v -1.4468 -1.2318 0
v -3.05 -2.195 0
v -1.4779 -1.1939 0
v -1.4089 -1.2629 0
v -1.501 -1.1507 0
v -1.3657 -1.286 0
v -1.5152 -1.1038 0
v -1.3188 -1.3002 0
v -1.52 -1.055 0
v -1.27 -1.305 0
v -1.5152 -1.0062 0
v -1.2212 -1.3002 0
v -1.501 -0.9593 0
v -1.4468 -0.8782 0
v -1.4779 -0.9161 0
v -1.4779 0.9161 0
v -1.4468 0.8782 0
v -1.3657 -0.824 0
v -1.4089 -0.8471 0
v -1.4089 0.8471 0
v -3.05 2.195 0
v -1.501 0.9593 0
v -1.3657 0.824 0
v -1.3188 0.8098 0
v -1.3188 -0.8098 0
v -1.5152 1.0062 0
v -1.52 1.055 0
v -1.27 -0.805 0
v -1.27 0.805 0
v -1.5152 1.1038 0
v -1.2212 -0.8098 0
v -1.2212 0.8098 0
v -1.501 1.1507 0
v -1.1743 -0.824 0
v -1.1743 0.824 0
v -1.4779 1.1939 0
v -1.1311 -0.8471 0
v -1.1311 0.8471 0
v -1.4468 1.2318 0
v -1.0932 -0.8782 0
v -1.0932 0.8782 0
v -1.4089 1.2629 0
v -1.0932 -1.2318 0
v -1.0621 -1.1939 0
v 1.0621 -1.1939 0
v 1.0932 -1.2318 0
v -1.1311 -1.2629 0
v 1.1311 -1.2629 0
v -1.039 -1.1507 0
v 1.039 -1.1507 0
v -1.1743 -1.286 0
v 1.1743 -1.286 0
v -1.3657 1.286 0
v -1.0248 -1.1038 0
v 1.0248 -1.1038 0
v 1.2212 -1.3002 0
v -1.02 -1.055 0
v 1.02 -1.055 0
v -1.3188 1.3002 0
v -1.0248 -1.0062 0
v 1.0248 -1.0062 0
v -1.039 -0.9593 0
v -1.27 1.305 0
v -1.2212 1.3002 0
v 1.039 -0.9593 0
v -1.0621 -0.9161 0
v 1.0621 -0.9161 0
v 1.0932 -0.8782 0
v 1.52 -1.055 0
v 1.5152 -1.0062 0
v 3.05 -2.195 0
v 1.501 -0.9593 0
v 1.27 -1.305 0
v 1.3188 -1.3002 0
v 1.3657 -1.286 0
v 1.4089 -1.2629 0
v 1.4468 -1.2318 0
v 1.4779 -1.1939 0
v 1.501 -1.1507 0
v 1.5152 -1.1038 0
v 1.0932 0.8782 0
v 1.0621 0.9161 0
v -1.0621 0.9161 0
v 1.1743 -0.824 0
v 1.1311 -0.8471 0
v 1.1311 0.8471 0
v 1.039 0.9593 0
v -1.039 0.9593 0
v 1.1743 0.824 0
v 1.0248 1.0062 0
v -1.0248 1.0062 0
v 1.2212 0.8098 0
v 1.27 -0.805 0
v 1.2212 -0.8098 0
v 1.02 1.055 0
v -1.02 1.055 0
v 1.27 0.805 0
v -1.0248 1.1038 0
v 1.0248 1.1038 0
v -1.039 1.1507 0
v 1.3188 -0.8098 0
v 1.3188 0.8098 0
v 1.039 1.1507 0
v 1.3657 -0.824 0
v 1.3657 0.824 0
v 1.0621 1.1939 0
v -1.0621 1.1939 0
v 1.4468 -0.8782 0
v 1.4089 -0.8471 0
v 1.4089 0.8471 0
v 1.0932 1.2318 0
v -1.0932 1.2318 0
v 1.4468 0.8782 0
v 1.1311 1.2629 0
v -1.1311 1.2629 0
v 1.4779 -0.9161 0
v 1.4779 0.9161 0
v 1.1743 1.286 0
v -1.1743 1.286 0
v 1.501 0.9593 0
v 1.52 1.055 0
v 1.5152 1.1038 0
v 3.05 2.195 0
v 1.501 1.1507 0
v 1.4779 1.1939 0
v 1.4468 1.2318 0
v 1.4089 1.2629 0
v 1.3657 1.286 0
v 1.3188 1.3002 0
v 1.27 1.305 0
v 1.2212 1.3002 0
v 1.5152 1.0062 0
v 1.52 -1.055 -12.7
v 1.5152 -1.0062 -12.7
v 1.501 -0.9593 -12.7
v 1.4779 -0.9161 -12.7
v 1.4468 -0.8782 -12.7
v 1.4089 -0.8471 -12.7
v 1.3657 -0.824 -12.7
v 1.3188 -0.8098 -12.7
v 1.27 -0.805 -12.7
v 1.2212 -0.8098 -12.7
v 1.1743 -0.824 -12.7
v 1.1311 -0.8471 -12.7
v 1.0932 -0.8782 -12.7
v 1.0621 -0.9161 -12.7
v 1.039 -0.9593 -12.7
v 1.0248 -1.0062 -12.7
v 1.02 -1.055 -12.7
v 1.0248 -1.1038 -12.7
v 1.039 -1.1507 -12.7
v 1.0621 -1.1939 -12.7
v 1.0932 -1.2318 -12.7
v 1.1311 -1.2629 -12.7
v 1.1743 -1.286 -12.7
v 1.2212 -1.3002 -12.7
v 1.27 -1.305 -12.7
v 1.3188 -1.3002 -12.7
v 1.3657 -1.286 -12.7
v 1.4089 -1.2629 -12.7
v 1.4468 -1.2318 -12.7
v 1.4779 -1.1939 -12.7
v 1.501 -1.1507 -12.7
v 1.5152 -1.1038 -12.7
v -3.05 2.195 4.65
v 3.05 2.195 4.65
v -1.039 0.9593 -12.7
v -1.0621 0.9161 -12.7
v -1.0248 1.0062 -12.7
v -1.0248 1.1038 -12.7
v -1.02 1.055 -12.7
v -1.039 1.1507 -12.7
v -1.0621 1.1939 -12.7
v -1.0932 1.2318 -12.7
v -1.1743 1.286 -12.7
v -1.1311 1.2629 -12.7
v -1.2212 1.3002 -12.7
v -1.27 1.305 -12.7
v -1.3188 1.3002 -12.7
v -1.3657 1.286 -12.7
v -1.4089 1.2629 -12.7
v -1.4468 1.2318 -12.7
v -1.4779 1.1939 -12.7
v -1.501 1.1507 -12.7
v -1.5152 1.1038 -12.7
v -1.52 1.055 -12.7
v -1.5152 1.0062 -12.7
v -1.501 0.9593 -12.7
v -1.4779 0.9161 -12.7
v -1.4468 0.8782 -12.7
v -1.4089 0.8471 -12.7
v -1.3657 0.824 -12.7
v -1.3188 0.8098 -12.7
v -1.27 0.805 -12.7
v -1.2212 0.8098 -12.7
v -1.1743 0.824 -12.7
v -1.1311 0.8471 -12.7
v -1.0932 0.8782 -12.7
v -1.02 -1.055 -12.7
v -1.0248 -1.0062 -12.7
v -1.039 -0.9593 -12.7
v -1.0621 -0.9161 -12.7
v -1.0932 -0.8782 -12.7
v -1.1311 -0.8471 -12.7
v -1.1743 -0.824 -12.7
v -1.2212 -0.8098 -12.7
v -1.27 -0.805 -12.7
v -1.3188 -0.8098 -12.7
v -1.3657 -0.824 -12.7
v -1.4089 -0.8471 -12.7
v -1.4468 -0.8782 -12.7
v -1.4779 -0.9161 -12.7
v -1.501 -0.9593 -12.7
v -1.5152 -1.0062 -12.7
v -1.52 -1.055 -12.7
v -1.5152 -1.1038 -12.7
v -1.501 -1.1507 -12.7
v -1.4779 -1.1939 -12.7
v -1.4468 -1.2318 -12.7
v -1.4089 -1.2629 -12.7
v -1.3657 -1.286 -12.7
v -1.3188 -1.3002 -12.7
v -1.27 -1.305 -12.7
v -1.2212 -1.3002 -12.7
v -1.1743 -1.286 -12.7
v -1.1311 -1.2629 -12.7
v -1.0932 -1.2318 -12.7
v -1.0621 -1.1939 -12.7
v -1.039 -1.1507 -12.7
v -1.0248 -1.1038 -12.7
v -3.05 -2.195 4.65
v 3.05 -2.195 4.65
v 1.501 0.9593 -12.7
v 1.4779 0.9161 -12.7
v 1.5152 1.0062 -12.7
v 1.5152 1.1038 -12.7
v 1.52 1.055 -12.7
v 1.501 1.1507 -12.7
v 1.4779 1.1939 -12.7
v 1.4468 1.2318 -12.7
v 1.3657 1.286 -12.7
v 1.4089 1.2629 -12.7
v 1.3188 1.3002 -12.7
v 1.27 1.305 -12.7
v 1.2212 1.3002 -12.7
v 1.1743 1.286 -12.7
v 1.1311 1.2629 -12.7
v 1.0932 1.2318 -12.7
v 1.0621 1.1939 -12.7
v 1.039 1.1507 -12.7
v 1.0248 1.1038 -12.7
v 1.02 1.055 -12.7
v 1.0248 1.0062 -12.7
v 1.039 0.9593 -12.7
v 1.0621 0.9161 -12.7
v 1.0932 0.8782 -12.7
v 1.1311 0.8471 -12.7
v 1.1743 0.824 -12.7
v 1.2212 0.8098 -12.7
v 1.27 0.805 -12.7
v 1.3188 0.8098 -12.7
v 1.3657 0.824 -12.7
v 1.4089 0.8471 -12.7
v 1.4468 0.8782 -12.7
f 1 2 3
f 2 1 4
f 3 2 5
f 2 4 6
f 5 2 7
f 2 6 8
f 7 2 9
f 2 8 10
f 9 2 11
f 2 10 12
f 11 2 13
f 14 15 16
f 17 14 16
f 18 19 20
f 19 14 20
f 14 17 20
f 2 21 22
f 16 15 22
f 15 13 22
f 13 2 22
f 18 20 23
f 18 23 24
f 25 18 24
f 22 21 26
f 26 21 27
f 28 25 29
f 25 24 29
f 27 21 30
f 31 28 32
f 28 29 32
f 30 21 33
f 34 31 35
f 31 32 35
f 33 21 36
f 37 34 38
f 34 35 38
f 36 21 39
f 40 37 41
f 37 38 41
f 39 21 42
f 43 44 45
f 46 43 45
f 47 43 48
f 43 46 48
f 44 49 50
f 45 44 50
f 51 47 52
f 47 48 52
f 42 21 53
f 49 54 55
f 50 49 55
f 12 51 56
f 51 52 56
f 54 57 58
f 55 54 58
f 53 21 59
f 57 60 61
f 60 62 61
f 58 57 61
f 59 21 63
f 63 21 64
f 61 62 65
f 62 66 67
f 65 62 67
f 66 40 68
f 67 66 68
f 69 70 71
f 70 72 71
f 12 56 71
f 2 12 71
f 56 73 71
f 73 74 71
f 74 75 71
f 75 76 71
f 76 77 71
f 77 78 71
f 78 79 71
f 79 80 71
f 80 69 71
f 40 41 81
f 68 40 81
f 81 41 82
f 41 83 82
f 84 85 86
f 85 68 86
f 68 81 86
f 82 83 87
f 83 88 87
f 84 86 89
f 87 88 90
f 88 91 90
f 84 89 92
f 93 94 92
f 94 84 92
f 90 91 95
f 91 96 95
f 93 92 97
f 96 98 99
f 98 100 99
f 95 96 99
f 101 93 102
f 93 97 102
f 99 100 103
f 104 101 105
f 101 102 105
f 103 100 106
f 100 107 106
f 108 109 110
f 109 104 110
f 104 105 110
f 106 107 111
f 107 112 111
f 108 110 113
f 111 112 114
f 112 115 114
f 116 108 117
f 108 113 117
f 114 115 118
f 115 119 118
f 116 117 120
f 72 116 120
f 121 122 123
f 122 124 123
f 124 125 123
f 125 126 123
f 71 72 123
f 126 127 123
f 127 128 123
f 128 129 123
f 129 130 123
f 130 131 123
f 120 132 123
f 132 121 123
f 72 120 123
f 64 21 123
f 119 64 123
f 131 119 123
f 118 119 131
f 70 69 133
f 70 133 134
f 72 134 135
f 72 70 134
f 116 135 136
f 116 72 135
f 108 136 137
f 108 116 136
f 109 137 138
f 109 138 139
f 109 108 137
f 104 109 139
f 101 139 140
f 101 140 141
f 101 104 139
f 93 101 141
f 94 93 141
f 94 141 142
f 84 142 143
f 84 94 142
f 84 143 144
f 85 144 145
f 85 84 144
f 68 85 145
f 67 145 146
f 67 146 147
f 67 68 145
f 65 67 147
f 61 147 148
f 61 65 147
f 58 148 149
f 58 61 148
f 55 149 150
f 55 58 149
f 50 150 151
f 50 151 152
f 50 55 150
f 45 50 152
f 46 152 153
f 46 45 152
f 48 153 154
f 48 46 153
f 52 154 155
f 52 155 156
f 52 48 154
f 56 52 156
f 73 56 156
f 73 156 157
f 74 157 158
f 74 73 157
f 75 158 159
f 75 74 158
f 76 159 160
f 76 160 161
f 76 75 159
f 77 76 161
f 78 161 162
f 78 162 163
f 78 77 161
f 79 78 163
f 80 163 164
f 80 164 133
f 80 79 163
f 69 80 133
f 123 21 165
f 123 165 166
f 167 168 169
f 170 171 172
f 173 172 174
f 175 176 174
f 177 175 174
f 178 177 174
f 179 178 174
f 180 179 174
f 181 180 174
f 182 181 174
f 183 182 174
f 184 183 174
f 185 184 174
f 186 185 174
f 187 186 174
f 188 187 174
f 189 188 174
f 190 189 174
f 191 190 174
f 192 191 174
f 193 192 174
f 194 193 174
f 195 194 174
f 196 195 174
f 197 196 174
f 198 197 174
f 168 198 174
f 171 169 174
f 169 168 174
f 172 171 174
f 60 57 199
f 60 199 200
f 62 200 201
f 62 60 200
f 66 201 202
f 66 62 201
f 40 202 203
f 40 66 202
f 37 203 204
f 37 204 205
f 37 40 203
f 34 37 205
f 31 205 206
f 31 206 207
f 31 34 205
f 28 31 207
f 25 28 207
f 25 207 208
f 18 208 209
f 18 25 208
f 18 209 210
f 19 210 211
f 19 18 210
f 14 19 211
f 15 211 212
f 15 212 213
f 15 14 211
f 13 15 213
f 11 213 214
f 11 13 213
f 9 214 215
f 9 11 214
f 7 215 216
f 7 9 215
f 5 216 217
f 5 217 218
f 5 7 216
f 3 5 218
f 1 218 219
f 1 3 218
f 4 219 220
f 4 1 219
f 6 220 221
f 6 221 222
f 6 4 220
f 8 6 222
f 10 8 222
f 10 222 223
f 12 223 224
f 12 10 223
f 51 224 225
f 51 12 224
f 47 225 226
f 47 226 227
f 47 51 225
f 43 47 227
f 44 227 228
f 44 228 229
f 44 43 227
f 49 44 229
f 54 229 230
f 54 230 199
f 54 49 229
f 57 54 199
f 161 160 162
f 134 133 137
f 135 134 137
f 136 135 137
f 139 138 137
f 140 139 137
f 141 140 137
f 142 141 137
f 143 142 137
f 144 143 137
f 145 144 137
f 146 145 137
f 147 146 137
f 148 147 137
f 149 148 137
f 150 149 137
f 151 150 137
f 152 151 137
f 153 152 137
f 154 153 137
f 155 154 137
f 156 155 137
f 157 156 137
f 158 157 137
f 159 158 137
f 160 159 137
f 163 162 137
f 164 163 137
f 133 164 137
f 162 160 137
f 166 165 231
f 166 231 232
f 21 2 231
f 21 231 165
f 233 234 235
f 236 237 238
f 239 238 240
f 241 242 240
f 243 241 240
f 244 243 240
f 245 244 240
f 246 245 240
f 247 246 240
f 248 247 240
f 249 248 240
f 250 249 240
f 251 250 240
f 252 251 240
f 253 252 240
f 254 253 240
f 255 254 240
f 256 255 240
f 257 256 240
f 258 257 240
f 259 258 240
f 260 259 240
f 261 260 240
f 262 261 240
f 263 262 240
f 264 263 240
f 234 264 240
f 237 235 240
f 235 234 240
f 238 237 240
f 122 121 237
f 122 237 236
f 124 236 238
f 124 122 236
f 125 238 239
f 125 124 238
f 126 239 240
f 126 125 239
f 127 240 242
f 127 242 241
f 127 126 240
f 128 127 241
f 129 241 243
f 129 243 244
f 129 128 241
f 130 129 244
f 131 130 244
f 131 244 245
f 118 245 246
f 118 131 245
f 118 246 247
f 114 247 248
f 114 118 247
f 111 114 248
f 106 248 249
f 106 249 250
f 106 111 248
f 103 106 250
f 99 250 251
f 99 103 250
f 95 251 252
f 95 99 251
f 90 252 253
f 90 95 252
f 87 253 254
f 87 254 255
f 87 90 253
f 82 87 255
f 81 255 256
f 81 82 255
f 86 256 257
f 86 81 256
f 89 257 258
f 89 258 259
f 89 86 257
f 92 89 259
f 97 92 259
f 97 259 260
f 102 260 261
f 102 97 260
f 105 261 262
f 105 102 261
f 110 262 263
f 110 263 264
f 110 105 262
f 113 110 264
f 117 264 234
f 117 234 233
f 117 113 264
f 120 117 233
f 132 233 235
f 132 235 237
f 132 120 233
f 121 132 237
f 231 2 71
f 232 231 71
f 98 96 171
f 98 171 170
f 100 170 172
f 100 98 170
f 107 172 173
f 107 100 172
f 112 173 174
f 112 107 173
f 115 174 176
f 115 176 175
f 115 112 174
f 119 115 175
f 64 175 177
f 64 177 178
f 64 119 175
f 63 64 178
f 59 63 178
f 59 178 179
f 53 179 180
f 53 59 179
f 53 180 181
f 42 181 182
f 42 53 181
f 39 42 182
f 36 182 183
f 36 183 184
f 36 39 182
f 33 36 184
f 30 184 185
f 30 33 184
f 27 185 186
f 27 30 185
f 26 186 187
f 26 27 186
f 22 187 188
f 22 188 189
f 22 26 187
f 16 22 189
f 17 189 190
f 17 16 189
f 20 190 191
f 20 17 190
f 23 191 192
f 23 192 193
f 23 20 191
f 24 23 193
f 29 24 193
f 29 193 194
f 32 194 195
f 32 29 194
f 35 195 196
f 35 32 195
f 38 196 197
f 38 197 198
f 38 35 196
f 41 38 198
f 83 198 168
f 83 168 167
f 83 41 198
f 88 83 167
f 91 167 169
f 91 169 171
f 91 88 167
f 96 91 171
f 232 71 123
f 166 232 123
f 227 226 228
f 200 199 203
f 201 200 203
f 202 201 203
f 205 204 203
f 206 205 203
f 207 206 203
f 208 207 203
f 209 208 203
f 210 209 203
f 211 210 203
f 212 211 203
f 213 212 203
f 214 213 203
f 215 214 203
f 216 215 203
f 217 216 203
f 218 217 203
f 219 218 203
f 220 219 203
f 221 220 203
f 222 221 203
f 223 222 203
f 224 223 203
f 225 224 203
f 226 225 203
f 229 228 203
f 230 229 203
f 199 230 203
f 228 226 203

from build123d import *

# Parameters (mm, degrees)
F0_W          = 6.1
F0_H          = 4.39
F0_R          = 0.25
F1_DEPTH      = 4.65
F2_DEPTH      = 4.65
F2_DEPTH_BACK = 12.7


with BuildPart() as f1:
    # F0 (on Top) → F1 (new body)
    with BuildSketch(Plane.XY):
        Rectangle(F0_W, F0_H)
        with Locations((-1.27, -1.055)):
            Circle(F0_R, mode=Mode.SUBTRACT)
        with Locations((1.27, -1.055)):
            Circle(F0_R, mode=Mode.SUBTRACT)
        with Locations((-1.27, 1.055)):
            Circle(F0_R, mode=Mode.SUBTRACT)
        with Locations((1.27, 1.055)):
            Circle(F0_R, mode=Mode.SUBTRACT)
    extrude(amount=F1_DEPTH)

    # F0 (on Top) → F2 (join, two sides)
    with BuildSketch(Plane.XY) as f2_sk:
        with Locations((1.27, 1.055)):
            Circle(F0_R)
        with Locations((-1.27, 1.055)):
            Circle(F0_R)
        with Locations((1.27, -1.055)):
            Circle(F0_R)
        with Locations((-1.27, -1.055)):
            Circle(F0_R)
    extrude(amount=F2_DEPTH)
    extrude(f2_sk.sketch, amount=-F2_DEPTH_BACK)


solid = f1.part
